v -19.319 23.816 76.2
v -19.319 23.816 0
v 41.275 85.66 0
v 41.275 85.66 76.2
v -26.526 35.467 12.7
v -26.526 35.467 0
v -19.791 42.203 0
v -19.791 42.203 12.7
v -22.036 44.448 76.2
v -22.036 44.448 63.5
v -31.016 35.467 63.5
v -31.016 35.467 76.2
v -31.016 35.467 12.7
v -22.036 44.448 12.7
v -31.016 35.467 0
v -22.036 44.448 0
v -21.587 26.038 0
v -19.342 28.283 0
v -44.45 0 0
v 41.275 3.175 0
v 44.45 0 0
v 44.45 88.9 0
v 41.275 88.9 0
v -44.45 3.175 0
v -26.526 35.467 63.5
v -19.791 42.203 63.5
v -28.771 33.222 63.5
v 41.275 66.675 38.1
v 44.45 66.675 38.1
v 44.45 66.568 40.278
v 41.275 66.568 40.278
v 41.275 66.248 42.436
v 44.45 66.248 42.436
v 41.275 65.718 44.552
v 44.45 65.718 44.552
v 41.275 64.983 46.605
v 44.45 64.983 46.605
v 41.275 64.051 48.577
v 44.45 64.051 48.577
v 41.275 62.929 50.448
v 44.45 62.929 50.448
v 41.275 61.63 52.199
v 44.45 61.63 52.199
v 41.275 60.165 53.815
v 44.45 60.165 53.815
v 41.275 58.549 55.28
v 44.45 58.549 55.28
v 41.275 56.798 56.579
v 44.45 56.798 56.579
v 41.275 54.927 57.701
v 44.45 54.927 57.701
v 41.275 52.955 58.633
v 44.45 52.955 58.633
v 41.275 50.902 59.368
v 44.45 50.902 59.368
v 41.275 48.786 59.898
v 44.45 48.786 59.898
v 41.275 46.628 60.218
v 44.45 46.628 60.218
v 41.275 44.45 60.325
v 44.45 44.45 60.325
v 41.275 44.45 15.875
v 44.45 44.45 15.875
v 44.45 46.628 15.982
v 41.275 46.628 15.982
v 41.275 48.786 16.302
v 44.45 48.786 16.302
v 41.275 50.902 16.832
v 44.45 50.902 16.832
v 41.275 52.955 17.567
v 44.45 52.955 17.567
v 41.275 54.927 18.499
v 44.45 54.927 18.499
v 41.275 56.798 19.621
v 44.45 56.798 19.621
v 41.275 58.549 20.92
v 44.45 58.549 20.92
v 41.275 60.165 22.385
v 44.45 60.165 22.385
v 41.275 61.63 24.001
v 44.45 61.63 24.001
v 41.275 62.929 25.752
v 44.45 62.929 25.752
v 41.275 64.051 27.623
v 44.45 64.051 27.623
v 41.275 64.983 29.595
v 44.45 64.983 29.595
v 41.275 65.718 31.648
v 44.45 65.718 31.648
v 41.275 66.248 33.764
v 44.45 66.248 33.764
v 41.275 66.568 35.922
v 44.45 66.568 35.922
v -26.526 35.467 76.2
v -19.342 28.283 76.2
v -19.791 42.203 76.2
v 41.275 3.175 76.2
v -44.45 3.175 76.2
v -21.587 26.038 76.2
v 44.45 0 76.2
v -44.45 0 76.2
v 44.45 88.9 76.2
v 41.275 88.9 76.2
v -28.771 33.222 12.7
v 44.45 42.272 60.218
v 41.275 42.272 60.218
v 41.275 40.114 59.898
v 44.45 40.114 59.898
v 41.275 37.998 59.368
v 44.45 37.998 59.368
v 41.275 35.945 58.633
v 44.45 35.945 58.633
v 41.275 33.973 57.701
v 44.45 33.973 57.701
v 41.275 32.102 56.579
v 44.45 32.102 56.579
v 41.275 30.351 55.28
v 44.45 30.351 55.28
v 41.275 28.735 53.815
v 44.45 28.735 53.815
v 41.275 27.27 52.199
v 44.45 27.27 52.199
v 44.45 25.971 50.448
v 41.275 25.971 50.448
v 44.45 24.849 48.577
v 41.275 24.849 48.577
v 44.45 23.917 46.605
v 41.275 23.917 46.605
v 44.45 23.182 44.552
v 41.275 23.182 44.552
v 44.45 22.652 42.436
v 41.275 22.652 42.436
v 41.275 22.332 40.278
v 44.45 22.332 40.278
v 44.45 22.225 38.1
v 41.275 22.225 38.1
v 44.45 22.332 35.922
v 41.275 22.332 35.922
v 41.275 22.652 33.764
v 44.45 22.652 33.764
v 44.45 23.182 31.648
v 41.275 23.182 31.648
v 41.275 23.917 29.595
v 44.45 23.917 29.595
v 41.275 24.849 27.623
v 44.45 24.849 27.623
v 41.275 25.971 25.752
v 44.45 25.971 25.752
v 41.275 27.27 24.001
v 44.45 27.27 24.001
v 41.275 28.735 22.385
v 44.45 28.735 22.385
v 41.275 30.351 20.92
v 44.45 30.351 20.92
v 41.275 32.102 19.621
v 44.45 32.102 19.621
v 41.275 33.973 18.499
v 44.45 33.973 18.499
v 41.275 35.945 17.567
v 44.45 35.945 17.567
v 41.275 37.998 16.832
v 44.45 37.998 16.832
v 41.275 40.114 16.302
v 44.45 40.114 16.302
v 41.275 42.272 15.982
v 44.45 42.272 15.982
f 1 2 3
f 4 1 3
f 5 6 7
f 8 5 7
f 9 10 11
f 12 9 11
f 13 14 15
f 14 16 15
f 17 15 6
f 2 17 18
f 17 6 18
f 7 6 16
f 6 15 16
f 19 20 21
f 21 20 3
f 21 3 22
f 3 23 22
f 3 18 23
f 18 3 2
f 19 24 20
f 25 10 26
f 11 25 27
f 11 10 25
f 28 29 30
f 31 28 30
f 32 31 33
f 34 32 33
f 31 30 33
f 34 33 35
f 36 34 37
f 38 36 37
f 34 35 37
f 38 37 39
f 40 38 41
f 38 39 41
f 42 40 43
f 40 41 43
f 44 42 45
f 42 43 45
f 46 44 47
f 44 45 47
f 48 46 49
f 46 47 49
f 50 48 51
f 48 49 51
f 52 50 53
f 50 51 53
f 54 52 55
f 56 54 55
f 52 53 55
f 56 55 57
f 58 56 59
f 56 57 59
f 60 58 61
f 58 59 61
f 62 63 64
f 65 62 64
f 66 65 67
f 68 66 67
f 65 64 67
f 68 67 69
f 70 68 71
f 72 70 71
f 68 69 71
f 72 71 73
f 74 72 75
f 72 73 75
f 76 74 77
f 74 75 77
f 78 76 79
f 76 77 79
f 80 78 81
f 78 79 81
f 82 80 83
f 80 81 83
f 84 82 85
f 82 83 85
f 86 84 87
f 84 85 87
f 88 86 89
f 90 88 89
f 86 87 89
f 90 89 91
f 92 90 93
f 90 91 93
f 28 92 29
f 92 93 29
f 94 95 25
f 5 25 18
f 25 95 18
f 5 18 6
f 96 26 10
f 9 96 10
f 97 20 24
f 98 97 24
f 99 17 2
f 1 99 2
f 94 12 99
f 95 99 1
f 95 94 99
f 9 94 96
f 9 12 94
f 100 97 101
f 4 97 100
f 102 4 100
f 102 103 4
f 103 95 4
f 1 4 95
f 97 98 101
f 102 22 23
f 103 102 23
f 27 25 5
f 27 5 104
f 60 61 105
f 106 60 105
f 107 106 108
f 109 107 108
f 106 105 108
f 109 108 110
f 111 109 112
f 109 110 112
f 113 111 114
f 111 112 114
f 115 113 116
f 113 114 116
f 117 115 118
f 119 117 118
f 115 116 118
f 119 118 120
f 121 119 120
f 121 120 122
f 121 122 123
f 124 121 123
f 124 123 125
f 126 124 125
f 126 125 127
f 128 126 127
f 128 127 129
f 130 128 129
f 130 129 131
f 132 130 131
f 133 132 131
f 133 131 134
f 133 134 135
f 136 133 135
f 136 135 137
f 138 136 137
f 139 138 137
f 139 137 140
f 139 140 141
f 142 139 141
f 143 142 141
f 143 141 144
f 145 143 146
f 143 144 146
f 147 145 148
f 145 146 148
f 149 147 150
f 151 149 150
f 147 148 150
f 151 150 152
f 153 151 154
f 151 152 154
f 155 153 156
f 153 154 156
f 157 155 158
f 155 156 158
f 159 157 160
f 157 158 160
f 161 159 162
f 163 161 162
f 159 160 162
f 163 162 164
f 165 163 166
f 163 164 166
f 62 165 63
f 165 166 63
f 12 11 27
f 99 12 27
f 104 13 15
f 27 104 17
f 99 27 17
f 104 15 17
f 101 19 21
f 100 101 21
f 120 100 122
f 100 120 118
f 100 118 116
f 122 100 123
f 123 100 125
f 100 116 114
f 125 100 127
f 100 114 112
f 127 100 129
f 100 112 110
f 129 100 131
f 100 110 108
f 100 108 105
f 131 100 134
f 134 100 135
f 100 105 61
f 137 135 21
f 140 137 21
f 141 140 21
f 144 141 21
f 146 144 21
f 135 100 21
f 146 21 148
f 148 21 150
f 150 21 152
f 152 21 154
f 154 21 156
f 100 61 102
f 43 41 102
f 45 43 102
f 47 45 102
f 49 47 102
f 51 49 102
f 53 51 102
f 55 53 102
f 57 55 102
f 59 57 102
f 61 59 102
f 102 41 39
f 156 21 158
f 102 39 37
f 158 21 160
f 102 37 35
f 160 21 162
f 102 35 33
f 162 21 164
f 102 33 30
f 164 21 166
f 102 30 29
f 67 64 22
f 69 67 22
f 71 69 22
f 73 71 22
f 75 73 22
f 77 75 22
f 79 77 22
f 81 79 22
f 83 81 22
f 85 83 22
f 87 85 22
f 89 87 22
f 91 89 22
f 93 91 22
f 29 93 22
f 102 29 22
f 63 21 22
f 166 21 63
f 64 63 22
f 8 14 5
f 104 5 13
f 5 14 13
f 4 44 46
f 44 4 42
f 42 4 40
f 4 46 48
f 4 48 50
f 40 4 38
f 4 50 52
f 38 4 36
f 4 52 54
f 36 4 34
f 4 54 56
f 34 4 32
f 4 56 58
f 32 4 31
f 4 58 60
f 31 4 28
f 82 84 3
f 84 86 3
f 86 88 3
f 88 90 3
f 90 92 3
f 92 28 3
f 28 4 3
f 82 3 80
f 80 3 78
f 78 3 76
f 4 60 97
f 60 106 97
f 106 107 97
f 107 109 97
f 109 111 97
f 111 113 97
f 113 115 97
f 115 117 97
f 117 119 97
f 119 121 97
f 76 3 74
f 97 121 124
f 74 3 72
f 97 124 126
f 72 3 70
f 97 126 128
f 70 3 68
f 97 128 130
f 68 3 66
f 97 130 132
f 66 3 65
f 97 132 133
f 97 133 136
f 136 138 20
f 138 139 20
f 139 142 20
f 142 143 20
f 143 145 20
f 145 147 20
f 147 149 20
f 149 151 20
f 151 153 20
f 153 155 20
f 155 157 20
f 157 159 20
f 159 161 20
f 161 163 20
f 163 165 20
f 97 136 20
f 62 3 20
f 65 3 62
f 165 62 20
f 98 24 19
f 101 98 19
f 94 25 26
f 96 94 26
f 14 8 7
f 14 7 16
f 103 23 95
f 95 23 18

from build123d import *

# Parameters (mm, degrees)
F2_DEPTH = 76.2
F3_W     = 12.7
F3_H     = 50.8
F4_DEPTH = 3.175
F6_DEPTH = 12.7


with BuildPart() as f2:
    # F1 (on Top) → F2 (new body)
    with BuildSketch(Plane.XY):
        Polygon((-44.45, 3.175), (-44.45, 0), (44.45, 0), (44.45, 3.175), (41.275, 3.175), align=None)
        Polygon((41.275, 3.175), (44.45, 3.175), (44.45, 88.9), (41.275, 85.659533), align=None)
        Polygon((-19.318937, 23.816169), (41.275, 85.659533), (41.275, 88.9), (-19.341729, 28.283271), (-21.586793, 26.038207), align=None)
        Polygon((-21.586793, 26.038207), (-19.341729, 28.283271), (-26.525934, 35.467476), (-19.790742, 42.202668), (-22.035806, 44.447732), (-31.016062, 35.467476), align=None)
        Polygon((41.275, 85.659533), (44.45, 88.9), (41.275, 88.9), align=None)
    extrude(amount=F2_DEPTH)

    # F3 (on face) → F4 (cut)
    with BuildSketch(Plane(origin=(-33.241769, 33.241769, 0), x_dir=(-0.707107, -0.707107, 0), z_dir=(-0.707107, 0.707107, 0))):
        with Locations((-9.497625, 38.1)):
            Rectangle(F3_W, F3_H)
    extrude(amount=-F4_DEPTH, mode=Mode.SUBTRACT)

    # F5 (on face) → F6 (cut)
    with BuildSketch(Plane.YZ.offset(44.45)):
        with BuildLine():
            ThreePointArc((44.45, 15.875), (60.165448, 22.384552), (66.675, 38.1))
            ThreePointArc((66.675, 38.1), (60.165448, 53.815448), (44.45, 60.325))
            Line((44.45, 60.325), (44.45, 15.875))
        make_face()
        with BuildLine():
            Line((44.45, 15.875), (44.45, 60.325))
            ThreePointArc((44.45, 60.325), (22.225, 38.1), (44.45, 15.875))
        make_face()
    extrude(amount=-F6_DEPTH, mode=Mode.SUBTRACT)


solid = f2.part
